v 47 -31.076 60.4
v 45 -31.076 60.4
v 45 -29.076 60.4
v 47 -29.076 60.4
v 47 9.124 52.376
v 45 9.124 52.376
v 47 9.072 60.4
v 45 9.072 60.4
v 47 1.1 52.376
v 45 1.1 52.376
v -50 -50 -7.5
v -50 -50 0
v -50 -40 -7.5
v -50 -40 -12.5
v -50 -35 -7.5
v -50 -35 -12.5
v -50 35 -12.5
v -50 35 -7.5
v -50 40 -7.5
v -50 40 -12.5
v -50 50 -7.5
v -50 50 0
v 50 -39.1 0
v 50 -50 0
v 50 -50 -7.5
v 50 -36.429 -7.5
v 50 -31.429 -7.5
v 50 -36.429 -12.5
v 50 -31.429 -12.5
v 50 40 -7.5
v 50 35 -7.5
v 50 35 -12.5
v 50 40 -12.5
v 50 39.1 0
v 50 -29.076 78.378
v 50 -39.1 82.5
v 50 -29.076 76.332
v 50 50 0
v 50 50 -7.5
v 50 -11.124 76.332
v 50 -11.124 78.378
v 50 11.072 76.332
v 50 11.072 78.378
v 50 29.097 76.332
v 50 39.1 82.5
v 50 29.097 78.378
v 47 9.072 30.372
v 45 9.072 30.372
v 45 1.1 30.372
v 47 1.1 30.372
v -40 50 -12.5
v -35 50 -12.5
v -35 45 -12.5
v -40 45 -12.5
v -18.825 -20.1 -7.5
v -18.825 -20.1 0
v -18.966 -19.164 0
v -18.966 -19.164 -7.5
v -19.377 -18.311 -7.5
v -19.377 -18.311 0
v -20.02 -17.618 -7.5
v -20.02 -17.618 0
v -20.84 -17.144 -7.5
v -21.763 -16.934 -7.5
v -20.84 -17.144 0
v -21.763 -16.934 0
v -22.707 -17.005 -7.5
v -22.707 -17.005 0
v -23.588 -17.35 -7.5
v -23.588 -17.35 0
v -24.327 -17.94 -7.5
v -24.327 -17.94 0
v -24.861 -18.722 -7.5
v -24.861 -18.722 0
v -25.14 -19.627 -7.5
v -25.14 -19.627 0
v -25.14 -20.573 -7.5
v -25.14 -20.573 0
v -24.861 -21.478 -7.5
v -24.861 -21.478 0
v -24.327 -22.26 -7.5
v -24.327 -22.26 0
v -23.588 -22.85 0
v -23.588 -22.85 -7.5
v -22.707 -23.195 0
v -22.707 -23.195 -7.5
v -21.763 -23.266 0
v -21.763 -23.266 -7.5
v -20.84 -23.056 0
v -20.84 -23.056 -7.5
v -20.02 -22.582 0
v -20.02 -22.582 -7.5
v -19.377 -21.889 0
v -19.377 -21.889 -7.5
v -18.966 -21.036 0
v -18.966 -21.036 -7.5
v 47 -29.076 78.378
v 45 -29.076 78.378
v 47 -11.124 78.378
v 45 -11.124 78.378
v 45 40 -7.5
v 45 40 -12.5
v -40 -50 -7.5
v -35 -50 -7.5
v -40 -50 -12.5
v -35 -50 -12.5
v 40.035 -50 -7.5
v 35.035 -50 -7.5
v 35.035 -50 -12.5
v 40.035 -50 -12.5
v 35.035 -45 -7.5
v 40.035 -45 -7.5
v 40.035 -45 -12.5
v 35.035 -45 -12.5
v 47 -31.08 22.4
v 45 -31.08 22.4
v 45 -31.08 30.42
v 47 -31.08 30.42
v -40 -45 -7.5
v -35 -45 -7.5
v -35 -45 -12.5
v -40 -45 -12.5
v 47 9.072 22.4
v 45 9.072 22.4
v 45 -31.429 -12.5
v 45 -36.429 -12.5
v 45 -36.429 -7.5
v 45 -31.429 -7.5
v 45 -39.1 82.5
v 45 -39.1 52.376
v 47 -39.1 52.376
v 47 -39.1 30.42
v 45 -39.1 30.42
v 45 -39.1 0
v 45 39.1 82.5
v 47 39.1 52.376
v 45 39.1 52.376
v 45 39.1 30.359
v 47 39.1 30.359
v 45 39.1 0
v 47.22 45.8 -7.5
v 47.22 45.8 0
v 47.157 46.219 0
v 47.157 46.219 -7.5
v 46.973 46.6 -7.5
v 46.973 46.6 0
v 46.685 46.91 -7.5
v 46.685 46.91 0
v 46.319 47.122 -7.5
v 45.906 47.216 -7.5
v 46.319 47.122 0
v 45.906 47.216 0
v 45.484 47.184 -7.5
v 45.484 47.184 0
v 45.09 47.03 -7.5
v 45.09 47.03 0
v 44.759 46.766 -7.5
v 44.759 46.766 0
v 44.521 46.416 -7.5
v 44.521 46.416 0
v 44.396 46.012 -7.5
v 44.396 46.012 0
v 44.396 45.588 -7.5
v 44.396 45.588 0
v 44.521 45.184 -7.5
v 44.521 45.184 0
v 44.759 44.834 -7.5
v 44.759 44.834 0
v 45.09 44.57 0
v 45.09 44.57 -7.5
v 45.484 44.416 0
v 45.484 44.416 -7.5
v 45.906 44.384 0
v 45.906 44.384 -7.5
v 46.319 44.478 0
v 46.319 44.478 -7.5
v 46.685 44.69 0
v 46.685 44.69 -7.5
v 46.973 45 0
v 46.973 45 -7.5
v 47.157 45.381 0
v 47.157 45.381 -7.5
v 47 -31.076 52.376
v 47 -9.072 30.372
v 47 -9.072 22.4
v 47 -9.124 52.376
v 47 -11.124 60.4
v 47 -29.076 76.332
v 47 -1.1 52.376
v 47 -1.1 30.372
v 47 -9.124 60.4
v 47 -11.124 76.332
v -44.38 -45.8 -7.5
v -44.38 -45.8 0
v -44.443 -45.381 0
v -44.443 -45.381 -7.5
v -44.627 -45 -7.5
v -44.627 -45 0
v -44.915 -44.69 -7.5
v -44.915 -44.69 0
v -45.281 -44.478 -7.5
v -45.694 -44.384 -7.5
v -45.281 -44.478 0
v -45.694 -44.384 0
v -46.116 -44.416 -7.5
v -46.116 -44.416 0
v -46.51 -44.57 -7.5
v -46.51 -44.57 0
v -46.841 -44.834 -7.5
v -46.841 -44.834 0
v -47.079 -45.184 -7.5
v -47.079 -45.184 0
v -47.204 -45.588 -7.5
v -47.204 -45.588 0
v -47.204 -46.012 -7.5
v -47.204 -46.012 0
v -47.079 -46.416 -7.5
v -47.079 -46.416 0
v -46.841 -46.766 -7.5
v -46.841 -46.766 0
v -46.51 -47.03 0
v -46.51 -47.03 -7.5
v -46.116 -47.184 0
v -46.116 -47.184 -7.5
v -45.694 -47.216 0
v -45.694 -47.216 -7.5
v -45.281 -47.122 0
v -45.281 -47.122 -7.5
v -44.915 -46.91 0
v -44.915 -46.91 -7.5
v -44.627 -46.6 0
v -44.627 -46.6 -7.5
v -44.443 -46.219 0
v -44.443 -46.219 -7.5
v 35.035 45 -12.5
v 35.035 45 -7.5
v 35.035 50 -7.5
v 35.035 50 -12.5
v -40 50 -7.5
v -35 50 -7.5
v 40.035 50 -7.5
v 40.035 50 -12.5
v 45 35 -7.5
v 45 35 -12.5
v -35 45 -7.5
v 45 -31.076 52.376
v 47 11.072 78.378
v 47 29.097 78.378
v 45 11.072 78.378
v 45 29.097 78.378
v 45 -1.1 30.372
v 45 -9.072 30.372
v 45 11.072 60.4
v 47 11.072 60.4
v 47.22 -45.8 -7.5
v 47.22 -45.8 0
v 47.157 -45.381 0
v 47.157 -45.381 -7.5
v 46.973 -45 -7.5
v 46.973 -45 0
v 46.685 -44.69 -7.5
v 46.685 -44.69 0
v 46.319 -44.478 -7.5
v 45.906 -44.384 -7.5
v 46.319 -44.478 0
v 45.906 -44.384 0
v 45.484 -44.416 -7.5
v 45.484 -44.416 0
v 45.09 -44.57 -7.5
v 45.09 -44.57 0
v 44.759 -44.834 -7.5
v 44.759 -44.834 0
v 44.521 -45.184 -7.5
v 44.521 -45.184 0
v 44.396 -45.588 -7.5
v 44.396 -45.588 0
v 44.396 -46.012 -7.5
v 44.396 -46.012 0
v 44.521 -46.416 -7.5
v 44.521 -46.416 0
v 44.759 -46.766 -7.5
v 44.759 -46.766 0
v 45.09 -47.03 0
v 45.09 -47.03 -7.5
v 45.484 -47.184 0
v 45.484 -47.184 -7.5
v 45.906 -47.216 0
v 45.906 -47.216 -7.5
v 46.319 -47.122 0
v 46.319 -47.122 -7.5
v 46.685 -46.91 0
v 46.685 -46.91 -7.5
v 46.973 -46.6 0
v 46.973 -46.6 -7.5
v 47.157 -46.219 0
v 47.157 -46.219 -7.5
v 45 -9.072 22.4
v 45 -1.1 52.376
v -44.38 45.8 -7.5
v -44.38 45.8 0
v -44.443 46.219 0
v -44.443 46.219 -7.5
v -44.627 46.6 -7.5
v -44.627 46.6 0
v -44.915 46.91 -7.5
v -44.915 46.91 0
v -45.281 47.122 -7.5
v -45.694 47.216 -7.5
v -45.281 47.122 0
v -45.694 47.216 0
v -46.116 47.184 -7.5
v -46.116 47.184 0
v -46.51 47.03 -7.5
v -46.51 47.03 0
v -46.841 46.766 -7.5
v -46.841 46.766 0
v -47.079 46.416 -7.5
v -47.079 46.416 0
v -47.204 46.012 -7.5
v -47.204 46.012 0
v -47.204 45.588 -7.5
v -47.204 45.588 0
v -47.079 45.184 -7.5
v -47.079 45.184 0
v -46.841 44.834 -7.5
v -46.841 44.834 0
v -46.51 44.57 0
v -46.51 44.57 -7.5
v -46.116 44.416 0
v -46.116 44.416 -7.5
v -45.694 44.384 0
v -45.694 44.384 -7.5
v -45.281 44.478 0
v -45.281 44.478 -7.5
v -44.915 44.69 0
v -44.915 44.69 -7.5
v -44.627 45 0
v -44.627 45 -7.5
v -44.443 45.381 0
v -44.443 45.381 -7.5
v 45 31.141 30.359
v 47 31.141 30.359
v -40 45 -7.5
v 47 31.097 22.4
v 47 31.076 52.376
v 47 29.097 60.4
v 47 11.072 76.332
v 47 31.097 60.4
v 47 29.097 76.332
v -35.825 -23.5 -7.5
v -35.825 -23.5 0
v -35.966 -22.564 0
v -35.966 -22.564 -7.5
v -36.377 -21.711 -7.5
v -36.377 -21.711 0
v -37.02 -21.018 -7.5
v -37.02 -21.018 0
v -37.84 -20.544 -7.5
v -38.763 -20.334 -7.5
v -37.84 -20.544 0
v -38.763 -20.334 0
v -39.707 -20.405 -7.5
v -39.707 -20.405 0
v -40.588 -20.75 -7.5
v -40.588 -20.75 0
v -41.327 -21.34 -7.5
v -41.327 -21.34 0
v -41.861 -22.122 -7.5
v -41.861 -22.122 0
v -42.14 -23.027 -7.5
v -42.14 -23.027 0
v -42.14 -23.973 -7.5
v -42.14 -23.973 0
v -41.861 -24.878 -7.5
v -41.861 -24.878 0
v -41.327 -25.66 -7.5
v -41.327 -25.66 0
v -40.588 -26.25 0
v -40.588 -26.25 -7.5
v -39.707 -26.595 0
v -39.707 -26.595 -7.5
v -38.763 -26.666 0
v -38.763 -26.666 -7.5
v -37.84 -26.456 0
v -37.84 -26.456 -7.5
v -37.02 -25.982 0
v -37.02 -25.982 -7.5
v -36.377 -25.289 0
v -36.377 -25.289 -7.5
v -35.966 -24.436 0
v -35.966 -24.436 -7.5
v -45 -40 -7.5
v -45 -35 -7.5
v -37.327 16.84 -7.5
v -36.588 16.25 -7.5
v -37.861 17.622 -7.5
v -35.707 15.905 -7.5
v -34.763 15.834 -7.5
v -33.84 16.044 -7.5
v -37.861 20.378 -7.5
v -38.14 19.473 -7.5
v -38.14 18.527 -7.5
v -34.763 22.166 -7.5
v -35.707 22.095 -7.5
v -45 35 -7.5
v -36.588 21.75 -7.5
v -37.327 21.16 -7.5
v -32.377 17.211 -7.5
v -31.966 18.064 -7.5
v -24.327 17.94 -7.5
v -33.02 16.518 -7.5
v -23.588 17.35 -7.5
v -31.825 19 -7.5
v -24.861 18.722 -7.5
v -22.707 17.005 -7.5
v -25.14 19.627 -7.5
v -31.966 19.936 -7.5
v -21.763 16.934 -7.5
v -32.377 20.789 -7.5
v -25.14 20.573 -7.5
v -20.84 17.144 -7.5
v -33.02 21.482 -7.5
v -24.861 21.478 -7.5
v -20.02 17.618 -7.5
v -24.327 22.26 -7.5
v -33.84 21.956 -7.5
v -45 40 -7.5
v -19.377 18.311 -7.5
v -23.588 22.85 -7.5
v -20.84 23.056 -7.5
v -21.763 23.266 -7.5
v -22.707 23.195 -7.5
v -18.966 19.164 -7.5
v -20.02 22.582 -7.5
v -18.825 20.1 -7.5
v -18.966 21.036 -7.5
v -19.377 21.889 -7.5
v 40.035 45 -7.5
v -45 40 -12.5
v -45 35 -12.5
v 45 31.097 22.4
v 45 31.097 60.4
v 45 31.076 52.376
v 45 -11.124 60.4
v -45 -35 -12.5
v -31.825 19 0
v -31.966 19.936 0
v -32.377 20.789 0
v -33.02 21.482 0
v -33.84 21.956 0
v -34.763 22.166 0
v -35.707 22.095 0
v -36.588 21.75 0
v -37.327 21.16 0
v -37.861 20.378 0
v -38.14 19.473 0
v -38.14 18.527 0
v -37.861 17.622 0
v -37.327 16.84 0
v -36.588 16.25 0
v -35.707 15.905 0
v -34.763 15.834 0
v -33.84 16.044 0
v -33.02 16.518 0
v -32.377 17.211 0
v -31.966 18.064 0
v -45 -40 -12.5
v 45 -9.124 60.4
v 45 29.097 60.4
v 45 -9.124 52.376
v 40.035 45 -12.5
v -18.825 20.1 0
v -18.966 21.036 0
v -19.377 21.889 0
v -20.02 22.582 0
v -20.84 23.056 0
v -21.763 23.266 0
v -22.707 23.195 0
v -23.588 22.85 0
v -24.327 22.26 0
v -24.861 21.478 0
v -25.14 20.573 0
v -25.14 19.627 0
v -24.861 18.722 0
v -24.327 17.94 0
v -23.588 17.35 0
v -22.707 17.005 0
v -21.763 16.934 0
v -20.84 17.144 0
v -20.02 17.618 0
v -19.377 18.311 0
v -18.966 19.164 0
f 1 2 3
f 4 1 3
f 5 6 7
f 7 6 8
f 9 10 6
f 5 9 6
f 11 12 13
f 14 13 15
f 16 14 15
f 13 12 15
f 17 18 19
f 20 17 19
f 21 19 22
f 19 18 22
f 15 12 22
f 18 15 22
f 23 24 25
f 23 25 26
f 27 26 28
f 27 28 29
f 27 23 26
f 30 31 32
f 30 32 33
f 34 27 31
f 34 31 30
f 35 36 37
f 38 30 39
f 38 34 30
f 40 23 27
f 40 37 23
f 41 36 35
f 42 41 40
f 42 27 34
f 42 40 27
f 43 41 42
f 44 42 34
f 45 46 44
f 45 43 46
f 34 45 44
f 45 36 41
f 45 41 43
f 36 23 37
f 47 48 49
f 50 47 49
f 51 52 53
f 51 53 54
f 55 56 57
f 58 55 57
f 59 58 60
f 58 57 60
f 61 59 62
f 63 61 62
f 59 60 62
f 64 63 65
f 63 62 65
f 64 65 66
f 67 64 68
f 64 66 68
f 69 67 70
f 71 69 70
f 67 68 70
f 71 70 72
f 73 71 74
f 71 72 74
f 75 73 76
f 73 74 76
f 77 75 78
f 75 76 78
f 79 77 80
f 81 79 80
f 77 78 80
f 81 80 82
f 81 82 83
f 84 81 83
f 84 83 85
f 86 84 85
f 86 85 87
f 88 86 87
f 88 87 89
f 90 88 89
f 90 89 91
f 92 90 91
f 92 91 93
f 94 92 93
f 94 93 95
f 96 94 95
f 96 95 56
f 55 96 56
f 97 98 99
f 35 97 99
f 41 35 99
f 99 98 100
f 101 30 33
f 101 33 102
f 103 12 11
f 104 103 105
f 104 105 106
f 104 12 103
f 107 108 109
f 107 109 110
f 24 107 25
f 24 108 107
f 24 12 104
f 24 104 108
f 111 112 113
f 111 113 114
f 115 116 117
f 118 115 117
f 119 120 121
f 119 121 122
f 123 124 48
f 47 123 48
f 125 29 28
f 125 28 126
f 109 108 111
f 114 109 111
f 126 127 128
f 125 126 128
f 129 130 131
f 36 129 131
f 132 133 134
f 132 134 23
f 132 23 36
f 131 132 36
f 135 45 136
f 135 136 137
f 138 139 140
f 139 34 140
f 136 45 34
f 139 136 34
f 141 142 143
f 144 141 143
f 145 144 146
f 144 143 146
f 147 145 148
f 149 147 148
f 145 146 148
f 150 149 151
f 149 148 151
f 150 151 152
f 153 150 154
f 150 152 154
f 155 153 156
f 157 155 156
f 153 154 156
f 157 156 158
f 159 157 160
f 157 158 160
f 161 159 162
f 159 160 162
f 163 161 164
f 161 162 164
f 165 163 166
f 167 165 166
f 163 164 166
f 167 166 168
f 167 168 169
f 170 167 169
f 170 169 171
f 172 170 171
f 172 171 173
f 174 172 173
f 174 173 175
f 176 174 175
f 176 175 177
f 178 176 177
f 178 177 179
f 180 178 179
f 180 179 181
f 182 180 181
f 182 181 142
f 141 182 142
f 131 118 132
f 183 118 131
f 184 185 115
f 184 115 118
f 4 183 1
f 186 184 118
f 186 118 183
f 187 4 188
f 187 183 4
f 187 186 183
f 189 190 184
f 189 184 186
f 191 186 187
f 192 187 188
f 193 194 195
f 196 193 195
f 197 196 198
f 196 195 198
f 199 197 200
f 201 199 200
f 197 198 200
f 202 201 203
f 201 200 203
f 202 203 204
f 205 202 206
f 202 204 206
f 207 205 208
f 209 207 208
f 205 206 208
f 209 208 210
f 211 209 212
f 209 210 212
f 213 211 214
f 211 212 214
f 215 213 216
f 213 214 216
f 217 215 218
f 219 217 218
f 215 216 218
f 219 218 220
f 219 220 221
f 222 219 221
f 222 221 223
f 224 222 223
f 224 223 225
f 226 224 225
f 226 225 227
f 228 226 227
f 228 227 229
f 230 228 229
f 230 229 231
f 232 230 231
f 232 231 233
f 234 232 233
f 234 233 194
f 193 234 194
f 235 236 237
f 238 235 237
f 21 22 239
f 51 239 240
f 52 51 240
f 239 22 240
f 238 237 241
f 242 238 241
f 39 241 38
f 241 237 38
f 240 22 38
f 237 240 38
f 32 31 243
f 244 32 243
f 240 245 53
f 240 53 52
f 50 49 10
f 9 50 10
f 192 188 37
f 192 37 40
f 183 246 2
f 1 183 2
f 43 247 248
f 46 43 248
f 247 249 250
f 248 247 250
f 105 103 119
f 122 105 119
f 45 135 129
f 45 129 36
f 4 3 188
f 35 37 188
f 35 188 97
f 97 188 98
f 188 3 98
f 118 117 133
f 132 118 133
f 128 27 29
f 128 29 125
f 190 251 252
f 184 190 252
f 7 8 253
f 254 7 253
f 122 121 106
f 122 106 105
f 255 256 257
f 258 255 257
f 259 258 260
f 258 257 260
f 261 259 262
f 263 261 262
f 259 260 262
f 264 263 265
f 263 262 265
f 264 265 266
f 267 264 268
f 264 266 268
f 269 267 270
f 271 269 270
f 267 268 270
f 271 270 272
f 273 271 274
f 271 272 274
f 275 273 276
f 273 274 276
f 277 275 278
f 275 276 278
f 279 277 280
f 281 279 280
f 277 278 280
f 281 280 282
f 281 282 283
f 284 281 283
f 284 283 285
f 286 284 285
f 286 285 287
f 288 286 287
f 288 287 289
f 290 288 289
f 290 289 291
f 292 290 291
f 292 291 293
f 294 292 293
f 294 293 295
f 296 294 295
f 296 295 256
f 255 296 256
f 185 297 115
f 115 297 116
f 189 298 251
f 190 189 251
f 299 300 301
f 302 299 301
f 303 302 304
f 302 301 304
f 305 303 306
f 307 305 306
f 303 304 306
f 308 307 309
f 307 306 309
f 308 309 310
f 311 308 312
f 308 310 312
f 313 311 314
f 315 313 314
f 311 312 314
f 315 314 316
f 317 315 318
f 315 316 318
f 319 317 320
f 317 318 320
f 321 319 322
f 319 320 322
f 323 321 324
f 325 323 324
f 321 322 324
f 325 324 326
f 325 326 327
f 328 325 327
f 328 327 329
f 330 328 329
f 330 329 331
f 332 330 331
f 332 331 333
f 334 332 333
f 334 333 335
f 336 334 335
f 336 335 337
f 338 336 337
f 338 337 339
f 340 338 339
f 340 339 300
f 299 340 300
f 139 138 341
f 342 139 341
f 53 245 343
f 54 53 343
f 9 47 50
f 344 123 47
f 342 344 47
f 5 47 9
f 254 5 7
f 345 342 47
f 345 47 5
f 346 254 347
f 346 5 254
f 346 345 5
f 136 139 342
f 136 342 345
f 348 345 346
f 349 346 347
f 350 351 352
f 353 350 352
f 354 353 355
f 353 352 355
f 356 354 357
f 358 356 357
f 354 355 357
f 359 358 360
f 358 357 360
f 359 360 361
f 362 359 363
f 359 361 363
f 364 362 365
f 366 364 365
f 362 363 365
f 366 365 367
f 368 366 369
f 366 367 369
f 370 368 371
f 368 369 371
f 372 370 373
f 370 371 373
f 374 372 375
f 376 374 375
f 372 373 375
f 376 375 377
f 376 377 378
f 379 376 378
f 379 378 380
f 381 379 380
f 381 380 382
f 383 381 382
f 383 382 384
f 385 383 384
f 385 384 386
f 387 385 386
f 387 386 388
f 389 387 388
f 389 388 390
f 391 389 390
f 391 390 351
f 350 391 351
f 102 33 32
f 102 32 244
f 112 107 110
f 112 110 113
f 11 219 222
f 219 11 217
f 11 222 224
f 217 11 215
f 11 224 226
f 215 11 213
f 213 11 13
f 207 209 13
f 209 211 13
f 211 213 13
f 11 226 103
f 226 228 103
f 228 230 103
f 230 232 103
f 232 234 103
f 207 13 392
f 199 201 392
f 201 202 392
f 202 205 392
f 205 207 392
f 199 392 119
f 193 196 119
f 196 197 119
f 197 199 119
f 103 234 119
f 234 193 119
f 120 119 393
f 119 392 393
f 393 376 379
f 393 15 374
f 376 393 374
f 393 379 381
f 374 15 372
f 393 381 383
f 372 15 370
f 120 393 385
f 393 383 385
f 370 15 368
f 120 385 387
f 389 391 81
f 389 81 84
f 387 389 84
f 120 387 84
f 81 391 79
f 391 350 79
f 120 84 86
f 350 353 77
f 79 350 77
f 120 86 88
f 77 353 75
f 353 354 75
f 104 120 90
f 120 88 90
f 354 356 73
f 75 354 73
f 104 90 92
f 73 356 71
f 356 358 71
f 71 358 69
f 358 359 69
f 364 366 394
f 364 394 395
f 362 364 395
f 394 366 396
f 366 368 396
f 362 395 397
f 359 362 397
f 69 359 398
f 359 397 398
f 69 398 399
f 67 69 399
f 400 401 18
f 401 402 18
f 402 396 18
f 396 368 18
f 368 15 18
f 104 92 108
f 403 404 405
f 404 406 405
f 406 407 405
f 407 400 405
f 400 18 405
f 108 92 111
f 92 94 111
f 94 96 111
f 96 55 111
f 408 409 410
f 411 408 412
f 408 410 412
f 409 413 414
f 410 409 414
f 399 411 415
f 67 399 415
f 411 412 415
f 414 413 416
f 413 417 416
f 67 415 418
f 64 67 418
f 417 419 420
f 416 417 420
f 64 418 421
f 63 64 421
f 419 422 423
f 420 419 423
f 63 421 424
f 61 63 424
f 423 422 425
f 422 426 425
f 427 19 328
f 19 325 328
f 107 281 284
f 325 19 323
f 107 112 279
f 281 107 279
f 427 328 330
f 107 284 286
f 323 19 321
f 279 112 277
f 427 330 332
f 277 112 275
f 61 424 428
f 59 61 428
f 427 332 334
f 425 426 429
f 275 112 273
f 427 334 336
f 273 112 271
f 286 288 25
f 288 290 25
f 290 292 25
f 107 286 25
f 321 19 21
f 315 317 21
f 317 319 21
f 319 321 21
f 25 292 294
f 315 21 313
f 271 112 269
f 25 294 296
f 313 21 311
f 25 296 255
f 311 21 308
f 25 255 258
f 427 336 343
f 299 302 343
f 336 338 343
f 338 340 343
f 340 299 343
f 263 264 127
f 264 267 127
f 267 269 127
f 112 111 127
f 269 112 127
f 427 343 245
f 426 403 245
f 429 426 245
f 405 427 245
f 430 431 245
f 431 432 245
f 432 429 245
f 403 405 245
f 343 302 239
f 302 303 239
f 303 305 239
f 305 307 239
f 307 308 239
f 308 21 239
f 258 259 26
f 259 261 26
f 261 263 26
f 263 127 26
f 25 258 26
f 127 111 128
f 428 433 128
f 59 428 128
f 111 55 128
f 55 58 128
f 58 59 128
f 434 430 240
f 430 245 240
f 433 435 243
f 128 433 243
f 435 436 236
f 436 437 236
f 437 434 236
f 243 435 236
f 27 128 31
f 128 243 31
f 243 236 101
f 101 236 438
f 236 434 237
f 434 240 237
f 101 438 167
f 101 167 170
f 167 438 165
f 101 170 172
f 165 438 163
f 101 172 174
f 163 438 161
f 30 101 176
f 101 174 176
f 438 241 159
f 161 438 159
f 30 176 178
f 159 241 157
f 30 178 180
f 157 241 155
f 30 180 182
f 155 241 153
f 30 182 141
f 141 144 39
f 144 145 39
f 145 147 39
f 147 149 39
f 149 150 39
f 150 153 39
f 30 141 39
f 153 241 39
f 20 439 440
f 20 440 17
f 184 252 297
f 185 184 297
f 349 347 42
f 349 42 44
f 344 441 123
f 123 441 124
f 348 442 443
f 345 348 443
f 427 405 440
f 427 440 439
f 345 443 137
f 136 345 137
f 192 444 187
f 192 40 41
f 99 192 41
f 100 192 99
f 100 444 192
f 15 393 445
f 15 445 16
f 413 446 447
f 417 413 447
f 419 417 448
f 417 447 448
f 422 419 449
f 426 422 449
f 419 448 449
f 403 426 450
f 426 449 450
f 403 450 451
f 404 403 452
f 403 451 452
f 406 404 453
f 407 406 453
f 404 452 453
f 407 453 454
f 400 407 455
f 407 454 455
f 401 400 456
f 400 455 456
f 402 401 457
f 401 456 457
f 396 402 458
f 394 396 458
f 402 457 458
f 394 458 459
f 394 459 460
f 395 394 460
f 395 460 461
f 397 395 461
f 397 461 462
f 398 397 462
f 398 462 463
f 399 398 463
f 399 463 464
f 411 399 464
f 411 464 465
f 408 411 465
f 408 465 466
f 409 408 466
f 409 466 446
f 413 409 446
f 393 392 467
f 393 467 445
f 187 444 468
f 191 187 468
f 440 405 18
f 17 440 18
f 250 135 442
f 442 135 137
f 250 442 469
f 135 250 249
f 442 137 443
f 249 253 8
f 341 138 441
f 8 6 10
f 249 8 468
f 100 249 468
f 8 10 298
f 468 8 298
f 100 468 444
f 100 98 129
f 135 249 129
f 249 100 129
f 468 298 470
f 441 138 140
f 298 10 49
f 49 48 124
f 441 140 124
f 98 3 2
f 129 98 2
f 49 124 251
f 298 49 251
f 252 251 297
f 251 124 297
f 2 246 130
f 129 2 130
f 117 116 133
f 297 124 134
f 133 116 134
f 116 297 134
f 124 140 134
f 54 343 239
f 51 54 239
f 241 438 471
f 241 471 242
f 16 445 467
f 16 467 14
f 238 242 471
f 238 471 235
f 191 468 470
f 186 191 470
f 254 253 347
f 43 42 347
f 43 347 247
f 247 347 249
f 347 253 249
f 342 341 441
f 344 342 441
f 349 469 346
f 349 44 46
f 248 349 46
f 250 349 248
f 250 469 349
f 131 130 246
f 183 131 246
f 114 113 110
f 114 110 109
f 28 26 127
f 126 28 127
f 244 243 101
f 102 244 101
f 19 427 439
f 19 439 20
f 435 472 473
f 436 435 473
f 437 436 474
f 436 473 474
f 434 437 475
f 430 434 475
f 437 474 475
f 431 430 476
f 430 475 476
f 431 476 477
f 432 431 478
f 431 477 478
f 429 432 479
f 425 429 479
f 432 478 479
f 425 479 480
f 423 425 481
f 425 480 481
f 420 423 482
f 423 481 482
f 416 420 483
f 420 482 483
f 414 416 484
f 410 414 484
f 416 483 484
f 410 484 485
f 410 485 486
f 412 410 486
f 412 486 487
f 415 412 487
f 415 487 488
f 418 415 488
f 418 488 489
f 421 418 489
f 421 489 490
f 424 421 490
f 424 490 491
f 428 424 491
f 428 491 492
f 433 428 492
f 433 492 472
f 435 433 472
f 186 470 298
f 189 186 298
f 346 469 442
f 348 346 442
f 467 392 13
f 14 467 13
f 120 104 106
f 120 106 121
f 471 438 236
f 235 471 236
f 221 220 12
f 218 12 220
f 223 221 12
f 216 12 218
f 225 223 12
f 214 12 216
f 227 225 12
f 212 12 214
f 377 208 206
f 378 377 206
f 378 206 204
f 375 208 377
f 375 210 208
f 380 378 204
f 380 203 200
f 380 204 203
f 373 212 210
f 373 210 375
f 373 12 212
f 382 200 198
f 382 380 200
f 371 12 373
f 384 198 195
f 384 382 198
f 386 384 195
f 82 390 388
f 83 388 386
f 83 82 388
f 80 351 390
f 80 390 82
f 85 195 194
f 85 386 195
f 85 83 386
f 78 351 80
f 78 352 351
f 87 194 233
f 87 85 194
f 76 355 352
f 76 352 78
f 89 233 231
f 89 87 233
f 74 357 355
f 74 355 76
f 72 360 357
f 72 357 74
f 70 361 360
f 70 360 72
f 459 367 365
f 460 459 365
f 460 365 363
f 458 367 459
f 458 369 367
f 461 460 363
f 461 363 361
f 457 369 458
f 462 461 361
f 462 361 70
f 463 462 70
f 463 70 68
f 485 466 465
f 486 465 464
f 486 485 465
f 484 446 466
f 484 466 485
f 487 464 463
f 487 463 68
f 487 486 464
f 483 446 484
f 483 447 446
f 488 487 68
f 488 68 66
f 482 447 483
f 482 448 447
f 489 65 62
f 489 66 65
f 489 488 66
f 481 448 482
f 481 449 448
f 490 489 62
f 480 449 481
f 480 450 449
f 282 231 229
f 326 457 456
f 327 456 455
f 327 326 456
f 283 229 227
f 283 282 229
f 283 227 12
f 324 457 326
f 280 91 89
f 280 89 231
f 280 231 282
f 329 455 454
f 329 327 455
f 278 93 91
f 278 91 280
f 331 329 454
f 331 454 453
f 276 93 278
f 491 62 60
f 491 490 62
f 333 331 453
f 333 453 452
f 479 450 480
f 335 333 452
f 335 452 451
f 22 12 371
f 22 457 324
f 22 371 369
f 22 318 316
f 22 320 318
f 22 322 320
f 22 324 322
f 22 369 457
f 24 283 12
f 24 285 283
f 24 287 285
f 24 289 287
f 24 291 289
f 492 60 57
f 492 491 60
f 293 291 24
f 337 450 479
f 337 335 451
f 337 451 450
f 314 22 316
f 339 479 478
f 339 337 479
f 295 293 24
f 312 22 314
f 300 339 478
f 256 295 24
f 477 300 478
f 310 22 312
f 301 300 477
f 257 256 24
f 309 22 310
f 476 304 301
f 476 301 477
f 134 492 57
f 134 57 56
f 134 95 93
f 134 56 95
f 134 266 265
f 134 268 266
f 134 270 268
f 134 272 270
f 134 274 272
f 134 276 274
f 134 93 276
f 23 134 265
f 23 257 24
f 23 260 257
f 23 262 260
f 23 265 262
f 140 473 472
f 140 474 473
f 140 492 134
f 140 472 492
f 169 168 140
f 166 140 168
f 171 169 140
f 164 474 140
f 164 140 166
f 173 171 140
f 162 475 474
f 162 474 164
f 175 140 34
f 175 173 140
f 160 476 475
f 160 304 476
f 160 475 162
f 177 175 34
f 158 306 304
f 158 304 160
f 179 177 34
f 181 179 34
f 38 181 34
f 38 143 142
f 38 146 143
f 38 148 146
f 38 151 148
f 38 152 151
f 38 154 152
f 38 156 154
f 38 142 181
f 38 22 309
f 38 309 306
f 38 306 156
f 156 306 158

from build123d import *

# Parameters (mm, degrees)
ESQUISSE3_W             = 100
ESQUISSE3_H             = 100
BOSS_EXTRU_1_DEPTH      = 7.5
ESQUISSE4_W             = 5
ESQUISSE4_H             = 5
BOSS_EXTRU_2_DEPTH      = 5
ESQUISSE5_R             = 3.175
ESQUISSE5_R_2           = 1.42
ENL_V_MAT_EXTRU_1_DEPTH = 10
BOSS_EXTRU_3_DEPTH      = 82.5
ENL_V_MAT_EXTRU_2_DEPTH = 2
ESQUISSE8_W             = 17.977516738
ESQUISSE8_H             = 17.952716394
ESQUISSE8_H_2           = 18.02477834
ENL_V_MAT_EXTRU_3_DEPTH = 2
ESQUISSE10_W            = 2.045095135
ESQUISSE10_H            = 18.02477834
ESQUISSE10_H_2          = 17.952716394
ENL_V_MAT_EXTRU_4_DEPTH = 10


with BuildPart() as part:
    # Esquisse3 → Boss.-Extru.1 (new body)
    with BuildSketch(Plane.XY):
        Rectangle(ESQUISSE3_W, ESQUISSE3_H)
    extrude(amount=-BOSS_EXTRU_1_DEPTH)

    # Esquisse4 → Boss.-Extru.2 (add)
    with BuildSketch(Plane(origin=(0, 0, -7.5), x_dir=(-1, 0, 0), z_dir=(0, 0, -1))):
        with Locations((-37.534911535, 47.5)):
            Rectangle(ESQUISSE4_W, ESQUISSE4_H)
        with Locations((37.5, 47.5)):
            Rectangle(ESQUISSE4_W, ESQUISSE4_H)
        with Locations((47.5, 37.5)):
            Rectangle(ESQUISSE4_W, ESQUISSE4_H)
        with Locations((47.5, -37.5)):
            Rectangle(ESQUISSE4_W, ESQUISSE4_H)
        with Locations((37.5, -47.5)):
            Rectangle(ESQUISSE4_W, ESQUISSE4_H)
        with Locations((-37.534911535, -47.5)):
            Rectangle(ESQUISSE4_W, ESQUISSE4_H)
        with Locations((-47.5, -33.92882297)):
            Rectangle(ESQUISSE4_W, ESQUISSE4_H)
        with Locations((-47.5, 37.5)):
            Rectangle(ESQUISSE4_W, ESQUISSE4_H)
    extrude(amount=BOSS_EXTRU_2_DEPTH)

    # Esquisse5 → Enlèv. mat.-Extru.1 (cut)
    with BuildSketch(Plane.XY):
        with Locations((-35, 19)):
            Circle(ESQUISSE5_R)
        with Locations((-39, -23.5)):
            Circle(ESQUISSE5_R)
        with Locations((-45.8, 45.8)):
            Circle(ESQUISSE5_R_2)
        with Locations((-45.8, -45.8)):
            Circle(ESQUISSE5_R_2)
        with Locations((45.8, -45.8)):
            Circle(ESQUISSE5_R_2)
        with Locations((45.8, 45.8)):
            Circle(ESQUISSE5_R_2)
        with Locations((-22, 20.1)):
            Circle(ESQUISSE5_R)
        with Locations((-22, -20.1)):
            Circle(ESQUISSE5_R)
    extrude(amount=-ENL_V_MAT_EXTRU_1_DEPTH, mode=Mode.SUBTRACT)

    # Esquisse6 → Boss.-Extru.3 (add)
    with BuildSketch(Plane.XY):
        Polygon((50, 0), (50, 39.1), (45, 39.1), (45, -39.1), (50, -39.1), align=None)
    extrude(amount=BOSS_EXTRU_3_DEPTH)

    # Esquisse7 → Enlèv. mat.-Extru.2 (cut)
    with BuildSketch(Plane.ZY.offset(-45)):
        Polygon((52.376358197, 39.1), (30.359102655, 39.1), (30.359102655, 31.140897345), (22.4, 31.09702268), (22.4, 9.07224434), (30.37224434, 9.07224434), (30.37224434, 1.1), (52.376358197, 1.1), (52.376358197, 9.123641803), (60.4, 9.07224434), (60.4, 31.09702268), (52.376358197, 31.076358197), align=None)
        Polygon((52.376358197, -1.1), (30.37224434, -1.1), (30.37224434, -9.07224434), (22.4, -9.07224434), (22.4, -31.079901273), (30.420098727, -31.079901273), (30.420098727, -39.1), (52.376358197, -39.1), (52.376358197, -31.076358197), (60.4, -31.076358197), (60.4, -9.123641803), (52.376358197, -9.123641803), align=None)
    extrude(amount=-ENL_V_MAT_EXTRU_2_DEPTH, mode=Mode.SUBTRACT)

    # Esquisse8 → Enlèv. mat.-Extru.3 (cut)
    with BuildSketch(Plane.ZY.offset(-45)):
        with Locations((69.388758369, -20.1)):
            Rectangle(ESQUISSE8_W, ESQUISSE8_H)
        with Locations((69.388758369, 20.08463351)):
            Rectangle(ESQUISSE8_W, ESQUISSE8_H_2)
    extrude(amount=-ENL_V_MAT_EXTRU_3_DEPTH, mode=Mode.SUBTRACT)

    # Esquisse10 → Enlèv. mat.-Extru.4 (cut)
    with BuildSketch(Plane.ZY.offset(-47)):
        with Locations((77.35496917, 20.08463351)):
            Rectangle(ESQUISSE10_W, ESQUISSE10_H)
        with Locations((77.35496917, -20.1)):
            Rectangle(ESQUISSE10_W, ESQUISSE10_H_2)
    extrude(amount=-ENL_V_MAT_EXTRU_4_DEPTH, mode=Mode.SUBTRACT)


solid = part.part
